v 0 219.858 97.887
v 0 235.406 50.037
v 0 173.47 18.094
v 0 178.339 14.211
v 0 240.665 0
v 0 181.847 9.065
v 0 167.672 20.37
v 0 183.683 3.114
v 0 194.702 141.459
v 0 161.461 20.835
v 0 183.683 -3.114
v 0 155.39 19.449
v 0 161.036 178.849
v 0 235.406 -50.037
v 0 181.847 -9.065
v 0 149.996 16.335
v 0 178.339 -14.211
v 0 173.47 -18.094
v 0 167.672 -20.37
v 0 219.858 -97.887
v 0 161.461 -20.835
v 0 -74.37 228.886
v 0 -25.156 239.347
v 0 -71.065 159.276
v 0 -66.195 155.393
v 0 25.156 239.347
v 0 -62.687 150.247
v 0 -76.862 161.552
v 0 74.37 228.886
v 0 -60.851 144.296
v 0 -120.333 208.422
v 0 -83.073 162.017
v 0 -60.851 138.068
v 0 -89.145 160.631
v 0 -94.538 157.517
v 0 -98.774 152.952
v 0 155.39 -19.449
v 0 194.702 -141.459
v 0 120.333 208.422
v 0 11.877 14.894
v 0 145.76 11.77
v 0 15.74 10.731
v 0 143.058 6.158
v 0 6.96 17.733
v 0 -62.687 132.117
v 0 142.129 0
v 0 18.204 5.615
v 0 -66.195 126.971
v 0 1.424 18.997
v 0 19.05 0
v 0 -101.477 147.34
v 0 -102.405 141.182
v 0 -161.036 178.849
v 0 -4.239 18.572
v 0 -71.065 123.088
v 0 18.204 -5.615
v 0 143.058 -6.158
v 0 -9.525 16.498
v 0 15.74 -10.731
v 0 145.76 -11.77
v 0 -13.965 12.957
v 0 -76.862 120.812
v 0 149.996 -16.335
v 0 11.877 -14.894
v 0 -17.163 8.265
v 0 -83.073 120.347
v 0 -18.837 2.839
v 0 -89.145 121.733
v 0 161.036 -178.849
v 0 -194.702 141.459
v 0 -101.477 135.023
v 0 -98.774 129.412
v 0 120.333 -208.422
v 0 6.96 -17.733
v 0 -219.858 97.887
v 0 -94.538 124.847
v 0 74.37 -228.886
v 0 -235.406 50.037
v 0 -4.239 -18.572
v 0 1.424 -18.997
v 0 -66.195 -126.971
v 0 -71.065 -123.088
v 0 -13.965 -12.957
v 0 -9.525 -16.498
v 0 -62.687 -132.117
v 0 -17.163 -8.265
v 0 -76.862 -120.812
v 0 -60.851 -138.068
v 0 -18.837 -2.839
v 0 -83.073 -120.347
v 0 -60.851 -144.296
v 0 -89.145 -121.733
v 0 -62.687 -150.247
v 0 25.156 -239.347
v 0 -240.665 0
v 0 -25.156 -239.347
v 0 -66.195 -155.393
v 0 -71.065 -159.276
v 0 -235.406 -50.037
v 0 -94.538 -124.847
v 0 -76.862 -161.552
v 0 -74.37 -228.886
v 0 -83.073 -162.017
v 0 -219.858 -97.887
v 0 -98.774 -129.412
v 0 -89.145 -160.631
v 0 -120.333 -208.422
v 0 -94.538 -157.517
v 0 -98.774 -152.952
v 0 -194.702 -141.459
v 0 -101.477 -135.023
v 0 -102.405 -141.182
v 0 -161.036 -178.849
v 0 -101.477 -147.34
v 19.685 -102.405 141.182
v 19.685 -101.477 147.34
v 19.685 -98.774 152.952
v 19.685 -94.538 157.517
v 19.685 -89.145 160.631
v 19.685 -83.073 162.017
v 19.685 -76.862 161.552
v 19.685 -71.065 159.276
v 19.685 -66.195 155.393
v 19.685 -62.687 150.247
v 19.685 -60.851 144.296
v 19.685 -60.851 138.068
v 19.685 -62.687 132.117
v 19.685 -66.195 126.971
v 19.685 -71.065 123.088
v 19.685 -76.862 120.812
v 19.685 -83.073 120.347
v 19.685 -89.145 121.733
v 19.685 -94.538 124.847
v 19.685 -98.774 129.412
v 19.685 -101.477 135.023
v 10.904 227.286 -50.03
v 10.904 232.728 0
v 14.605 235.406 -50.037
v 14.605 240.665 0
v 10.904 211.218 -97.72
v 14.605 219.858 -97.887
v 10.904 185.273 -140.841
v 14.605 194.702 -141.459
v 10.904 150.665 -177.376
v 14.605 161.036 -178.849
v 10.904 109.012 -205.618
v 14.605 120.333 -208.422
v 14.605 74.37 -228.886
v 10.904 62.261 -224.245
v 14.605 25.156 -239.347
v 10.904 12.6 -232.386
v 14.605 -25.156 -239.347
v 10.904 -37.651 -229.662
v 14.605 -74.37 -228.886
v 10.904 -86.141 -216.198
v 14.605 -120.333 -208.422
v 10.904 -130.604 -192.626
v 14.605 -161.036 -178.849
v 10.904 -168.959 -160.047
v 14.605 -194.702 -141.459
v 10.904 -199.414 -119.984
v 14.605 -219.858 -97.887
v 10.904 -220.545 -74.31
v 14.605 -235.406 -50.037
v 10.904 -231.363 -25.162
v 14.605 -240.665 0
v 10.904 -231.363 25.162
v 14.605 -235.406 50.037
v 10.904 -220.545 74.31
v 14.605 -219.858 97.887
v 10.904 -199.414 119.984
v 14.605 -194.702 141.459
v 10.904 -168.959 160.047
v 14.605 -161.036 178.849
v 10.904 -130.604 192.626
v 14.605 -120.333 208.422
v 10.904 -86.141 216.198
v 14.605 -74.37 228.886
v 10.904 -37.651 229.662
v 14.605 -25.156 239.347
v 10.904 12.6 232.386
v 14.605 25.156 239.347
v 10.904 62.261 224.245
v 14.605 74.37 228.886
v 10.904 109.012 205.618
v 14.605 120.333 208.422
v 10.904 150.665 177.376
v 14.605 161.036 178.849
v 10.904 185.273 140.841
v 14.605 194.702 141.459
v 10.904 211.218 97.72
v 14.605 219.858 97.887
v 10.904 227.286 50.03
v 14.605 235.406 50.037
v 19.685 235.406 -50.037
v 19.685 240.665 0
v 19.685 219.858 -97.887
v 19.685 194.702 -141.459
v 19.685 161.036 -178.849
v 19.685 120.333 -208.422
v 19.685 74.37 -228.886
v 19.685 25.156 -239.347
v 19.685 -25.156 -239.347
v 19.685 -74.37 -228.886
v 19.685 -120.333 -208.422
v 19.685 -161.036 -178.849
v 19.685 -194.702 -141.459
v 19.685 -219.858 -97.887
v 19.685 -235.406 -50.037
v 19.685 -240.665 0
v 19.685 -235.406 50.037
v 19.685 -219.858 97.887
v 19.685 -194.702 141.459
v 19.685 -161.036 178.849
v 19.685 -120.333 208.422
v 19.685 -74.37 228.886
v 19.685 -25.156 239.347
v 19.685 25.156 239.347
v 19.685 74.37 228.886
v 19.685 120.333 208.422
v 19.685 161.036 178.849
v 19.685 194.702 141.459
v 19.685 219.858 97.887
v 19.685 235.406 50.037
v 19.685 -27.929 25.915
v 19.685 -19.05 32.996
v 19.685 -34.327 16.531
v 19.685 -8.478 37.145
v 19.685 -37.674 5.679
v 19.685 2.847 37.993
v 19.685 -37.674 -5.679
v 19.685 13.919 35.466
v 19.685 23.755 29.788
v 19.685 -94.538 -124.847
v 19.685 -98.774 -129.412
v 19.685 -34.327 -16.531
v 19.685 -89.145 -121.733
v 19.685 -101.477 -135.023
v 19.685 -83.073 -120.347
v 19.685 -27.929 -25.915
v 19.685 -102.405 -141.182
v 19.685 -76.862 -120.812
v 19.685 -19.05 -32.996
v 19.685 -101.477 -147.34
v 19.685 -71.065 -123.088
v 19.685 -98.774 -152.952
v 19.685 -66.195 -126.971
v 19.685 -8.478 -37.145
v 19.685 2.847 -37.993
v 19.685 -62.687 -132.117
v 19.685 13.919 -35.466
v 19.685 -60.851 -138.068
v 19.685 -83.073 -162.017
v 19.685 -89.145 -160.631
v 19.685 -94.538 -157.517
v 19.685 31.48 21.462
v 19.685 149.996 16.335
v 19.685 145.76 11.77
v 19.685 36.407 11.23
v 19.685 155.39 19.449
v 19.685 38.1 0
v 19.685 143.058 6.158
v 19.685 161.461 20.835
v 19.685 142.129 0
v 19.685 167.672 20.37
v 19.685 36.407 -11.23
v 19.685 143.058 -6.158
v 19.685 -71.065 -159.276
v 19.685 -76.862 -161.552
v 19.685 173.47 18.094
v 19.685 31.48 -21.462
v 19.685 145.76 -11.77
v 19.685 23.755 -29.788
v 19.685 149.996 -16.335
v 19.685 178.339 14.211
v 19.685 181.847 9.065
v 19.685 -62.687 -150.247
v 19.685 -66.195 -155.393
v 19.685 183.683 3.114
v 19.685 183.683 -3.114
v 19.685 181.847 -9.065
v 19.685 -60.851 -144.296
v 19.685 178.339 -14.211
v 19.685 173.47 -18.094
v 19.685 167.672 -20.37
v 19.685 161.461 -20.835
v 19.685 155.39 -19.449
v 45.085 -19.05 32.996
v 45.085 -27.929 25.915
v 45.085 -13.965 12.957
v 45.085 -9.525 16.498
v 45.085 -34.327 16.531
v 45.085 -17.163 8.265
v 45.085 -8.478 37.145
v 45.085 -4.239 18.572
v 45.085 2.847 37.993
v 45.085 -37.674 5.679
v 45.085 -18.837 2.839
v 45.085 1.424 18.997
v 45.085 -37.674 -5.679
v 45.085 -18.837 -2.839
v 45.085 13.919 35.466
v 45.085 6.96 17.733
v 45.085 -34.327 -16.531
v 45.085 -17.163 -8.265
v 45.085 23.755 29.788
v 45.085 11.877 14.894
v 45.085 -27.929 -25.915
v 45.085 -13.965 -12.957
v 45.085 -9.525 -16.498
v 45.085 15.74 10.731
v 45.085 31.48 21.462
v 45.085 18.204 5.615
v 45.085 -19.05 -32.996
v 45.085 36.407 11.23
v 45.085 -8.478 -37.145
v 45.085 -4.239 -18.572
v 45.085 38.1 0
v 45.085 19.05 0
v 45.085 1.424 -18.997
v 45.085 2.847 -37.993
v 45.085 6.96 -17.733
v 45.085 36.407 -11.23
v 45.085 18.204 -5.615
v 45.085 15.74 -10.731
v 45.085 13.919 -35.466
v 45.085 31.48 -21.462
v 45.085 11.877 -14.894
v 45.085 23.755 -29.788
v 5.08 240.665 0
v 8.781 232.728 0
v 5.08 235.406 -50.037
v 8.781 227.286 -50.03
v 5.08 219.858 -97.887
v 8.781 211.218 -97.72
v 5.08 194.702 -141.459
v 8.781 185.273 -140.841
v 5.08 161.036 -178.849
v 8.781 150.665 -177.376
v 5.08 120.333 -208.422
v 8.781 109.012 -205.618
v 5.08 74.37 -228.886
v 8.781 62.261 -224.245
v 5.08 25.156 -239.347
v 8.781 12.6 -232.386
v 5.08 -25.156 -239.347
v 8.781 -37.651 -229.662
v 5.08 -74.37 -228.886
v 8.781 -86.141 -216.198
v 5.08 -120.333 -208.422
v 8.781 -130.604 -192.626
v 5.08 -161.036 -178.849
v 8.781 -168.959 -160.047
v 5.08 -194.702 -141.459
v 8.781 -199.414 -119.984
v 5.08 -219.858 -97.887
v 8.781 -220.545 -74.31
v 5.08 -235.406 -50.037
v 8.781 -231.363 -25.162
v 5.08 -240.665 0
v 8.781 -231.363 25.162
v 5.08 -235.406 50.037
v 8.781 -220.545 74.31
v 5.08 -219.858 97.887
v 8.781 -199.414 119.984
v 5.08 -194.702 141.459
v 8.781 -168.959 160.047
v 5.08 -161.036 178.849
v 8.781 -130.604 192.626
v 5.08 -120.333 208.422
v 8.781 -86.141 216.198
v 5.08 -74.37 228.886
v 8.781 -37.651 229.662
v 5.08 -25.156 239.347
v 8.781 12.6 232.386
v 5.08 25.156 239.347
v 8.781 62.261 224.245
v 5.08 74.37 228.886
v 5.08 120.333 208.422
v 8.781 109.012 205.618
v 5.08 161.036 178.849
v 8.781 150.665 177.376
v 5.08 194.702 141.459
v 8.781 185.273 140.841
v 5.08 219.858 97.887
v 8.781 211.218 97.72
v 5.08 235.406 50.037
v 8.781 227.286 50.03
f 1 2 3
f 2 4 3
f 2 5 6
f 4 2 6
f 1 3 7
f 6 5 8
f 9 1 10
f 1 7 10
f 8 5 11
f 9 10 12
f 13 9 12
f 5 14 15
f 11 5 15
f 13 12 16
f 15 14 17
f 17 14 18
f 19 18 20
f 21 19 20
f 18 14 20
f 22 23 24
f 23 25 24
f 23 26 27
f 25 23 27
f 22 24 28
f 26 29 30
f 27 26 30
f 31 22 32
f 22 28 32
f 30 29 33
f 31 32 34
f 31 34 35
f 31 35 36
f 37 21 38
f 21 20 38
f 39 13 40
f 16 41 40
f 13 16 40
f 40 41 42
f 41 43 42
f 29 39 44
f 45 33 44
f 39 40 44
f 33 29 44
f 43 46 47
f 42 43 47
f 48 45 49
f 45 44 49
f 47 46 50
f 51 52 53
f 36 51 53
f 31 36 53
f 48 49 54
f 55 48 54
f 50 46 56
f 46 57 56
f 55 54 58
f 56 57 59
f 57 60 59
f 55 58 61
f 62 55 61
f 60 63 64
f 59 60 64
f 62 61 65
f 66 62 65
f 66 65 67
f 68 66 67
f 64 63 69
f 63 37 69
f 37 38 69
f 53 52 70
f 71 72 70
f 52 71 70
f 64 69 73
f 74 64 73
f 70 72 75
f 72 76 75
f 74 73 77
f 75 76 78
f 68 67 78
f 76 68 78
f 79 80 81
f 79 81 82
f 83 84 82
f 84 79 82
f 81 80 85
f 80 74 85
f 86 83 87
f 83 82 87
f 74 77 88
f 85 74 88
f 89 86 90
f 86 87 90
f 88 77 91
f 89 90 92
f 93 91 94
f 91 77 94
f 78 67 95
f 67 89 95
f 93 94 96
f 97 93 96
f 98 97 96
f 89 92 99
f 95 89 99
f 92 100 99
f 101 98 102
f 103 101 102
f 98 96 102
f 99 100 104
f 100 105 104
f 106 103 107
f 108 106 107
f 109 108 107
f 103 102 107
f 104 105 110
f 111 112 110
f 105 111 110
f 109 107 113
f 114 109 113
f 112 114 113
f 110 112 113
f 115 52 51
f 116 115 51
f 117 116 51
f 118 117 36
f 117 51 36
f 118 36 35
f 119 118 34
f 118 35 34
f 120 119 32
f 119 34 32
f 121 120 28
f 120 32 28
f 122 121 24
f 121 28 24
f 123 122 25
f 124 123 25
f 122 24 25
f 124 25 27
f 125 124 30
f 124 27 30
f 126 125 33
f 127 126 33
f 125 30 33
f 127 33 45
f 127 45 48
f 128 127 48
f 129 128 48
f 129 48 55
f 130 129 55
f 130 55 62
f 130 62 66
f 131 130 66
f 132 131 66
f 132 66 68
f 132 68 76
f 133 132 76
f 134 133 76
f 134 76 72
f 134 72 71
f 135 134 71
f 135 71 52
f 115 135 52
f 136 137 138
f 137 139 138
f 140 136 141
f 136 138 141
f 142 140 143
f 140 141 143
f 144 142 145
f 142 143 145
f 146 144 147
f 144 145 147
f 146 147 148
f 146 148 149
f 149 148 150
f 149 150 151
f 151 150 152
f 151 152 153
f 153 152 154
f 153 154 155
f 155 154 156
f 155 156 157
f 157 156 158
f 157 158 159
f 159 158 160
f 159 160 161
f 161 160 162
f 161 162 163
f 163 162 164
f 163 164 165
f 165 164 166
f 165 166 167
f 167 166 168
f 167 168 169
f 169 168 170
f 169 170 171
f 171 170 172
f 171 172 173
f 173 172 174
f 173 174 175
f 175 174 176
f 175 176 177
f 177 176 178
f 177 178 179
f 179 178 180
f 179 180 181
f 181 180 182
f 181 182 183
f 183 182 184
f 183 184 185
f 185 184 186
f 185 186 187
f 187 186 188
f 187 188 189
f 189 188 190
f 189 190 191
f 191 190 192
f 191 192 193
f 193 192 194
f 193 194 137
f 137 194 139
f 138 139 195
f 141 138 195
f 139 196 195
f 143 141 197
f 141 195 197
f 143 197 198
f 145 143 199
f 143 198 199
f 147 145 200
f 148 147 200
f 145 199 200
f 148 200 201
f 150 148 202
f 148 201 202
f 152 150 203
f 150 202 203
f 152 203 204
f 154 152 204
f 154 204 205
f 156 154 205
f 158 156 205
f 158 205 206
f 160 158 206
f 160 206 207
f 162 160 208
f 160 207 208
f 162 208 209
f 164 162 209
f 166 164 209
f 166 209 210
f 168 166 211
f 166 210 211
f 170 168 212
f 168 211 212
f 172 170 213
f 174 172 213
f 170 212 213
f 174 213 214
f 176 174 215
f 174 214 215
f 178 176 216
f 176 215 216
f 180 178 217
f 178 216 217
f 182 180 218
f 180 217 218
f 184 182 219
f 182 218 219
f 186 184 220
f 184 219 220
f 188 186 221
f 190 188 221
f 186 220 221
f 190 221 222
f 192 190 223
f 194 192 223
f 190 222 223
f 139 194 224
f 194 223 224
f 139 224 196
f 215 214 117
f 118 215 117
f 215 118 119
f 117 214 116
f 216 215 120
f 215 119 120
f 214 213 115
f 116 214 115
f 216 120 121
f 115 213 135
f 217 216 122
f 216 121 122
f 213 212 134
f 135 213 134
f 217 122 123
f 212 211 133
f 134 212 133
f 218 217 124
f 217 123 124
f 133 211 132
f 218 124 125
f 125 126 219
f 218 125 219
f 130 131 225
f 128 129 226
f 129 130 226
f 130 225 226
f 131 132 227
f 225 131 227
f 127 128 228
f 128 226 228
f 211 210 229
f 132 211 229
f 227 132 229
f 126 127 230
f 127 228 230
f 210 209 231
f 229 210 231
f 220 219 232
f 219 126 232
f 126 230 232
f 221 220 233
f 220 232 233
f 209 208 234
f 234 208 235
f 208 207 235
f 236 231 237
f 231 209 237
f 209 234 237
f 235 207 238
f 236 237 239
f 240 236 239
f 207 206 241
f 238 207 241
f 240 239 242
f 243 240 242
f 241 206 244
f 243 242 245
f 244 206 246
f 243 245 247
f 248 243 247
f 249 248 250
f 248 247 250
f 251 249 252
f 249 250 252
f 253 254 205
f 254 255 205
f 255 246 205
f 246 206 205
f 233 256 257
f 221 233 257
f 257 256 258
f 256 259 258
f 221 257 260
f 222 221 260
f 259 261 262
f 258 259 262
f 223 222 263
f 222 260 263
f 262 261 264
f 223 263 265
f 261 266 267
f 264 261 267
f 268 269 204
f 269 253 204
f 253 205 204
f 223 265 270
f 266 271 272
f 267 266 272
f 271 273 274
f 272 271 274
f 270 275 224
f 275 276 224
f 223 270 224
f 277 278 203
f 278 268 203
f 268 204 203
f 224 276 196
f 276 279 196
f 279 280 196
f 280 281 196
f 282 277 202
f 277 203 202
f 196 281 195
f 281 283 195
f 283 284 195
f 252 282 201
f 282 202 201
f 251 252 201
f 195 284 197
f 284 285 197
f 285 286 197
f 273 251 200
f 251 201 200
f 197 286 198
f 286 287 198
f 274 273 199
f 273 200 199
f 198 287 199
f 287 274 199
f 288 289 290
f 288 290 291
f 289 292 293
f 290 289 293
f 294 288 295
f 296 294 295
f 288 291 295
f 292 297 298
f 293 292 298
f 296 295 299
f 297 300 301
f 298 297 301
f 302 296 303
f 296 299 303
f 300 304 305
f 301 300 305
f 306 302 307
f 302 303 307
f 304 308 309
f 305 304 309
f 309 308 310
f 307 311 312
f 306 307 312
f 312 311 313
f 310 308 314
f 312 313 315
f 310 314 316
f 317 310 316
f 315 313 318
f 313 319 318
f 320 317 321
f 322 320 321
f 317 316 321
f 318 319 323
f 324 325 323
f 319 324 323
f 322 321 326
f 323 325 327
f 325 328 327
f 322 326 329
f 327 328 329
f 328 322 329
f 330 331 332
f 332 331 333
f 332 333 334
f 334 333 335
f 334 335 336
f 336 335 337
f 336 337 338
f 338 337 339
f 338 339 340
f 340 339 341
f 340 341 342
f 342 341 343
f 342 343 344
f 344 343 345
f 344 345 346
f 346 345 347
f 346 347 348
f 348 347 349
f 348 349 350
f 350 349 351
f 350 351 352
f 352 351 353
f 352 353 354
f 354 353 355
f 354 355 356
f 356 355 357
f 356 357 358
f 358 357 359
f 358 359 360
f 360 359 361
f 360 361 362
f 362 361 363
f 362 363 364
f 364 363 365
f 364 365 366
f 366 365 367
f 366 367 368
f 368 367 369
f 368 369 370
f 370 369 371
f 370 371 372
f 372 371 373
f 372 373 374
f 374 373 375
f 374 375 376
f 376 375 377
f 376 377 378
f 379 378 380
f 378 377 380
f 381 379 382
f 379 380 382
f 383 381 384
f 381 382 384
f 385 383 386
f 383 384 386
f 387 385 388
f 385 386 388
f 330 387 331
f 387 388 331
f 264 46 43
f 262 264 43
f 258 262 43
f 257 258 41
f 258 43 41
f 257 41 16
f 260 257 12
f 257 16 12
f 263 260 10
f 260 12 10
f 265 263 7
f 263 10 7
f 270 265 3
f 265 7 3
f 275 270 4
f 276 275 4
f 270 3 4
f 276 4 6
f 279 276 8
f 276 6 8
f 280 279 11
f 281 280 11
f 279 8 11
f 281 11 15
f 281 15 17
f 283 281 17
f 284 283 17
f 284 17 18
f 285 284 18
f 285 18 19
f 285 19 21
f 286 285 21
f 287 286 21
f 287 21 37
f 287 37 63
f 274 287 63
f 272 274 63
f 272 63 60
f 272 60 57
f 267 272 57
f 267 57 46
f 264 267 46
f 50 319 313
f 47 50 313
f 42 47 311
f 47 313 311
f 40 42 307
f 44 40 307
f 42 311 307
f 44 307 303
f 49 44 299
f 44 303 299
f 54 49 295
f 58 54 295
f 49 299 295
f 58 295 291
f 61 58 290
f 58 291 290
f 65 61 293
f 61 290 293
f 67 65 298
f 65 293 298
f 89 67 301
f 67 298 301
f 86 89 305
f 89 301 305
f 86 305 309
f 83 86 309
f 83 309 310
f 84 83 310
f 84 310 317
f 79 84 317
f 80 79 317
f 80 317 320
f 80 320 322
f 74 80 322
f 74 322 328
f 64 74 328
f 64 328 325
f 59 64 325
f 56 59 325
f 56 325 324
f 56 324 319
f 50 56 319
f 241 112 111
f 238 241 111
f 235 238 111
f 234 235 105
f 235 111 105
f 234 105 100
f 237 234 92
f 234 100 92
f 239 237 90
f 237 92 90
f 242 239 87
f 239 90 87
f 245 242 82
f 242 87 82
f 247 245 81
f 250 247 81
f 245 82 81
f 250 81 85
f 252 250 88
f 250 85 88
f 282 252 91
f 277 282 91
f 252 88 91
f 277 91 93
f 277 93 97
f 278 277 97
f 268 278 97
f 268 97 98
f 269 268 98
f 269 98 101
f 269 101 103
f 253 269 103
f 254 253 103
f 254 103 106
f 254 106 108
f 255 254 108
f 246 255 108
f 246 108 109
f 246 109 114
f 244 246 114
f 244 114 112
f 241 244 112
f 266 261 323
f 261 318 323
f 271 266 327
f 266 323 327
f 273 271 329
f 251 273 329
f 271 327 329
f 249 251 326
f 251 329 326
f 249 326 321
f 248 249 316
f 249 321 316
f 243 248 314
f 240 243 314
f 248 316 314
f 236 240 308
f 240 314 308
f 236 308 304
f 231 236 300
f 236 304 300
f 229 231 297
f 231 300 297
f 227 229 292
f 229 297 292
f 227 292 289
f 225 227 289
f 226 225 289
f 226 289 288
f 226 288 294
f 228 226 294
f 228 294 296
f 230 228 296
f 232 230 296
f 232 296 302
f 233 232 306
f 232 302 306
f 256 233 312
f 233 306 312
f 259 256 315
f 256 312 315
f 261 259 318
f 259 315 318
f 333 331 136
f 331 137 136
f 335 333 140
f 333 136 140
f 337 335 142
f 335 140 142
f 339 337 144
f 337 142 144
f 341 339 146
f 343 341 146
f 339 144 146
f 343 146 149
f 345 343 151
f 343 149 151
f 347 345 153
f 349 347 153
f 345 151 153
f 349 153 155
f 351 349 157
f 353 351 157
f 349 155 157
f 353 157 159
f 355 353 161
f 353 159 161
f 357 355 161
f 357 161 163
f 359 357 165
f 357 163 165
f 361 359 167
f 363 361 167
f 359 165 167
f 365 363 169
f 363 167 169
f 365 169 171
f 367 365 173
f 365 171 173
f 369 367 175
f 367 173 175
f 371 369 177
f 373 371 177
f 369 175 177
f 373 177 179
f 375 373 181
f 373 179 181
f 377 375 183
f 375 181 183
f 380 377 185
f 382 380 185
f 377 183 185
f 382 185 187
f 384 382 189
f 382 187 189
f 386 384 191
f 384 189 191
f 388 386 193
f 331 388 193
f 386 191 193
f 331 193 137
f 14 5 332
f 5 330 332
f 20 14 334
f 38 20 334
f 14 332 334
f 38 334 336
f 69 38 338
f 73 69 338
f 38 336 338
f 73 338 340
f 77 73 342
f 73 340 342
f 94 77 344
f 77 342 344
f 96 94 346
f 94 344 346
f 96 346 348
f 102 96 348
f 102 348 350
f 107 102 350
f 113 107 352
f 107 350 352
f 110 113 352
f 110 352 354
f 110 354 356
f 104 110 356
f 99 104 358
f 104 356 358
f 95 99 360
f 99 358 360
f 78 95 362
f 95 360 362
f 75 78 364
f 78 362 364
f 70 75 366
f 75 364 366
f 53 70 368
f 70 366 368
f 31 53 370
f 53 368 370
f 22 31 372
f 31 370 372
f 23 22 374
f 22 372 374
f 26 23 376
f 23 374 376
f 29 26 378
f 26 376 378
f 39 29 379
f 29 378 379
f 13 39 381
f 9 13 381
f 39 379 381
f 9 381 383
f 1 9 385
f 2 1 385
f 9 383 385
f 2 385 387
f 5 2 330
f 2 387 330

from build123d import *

# Parameters (mm, degrees)
SKETCH3_R          = 19.05
CUT_EXTRUDE1_DEPTH = 344.324834049
SKETCH4_R          = 20.893502845
CUT_EXTRUDE2_DEPTH = 344.324834049


with BuildPart() as part:
    # Sketch2 → Revolve1 (revolve)
    with BuildSketch(Plane.XY):
        Polygon((0, 0), (0, 240.665), (5.08, 240.665), (8.781317037, 232.7275), (10.903682963, 232.7275), (14.605, 240.665), (19.685, 240.665), (19.685, 38.1), (45.085, 38.1), (45.085, 0), align=None)
    revolve(axis=Axis((45.085, 0, 0), (-1, 0, 0)))

    # Sketch3 → Cut-Extrude1 (cut, through all)
    with BuildSketch(Plane(origin=(45.085, 0, 0), x_dir=(0, 0, -1), z_dir=(1, 0, 0))):
        with Locations(Location((0, 0, 0), (0, 0, 90))):
            Circle(SKETCH3_R)
    extrude(amount=-CUT_EXTRUDE1_DEPTH, mode=Mode.SUBTRACT)

    # Sketch4 → Cut-Extrude2 (cut, through all)
    with BuildSketch(Plane.ZY):
        with Locations(Location((0, 163.022805962, 0), (0, 0, 270))):
            Circle(SKETCH4_R)
        with Locations(Location((141.181891359, -81.511402981, 0), (0, 0, 270))):
            Circle(SKETCH4_R)
        with Locations(Location((-141.181891359, -81.511402981, 0), (0, 0, 270))):
            Circle(SKETCH4_R)
    extrude(amount=-CUT_EXTRUDE2_DEPTH, mode=Mode.SUBTRACT)


solid = part.part
